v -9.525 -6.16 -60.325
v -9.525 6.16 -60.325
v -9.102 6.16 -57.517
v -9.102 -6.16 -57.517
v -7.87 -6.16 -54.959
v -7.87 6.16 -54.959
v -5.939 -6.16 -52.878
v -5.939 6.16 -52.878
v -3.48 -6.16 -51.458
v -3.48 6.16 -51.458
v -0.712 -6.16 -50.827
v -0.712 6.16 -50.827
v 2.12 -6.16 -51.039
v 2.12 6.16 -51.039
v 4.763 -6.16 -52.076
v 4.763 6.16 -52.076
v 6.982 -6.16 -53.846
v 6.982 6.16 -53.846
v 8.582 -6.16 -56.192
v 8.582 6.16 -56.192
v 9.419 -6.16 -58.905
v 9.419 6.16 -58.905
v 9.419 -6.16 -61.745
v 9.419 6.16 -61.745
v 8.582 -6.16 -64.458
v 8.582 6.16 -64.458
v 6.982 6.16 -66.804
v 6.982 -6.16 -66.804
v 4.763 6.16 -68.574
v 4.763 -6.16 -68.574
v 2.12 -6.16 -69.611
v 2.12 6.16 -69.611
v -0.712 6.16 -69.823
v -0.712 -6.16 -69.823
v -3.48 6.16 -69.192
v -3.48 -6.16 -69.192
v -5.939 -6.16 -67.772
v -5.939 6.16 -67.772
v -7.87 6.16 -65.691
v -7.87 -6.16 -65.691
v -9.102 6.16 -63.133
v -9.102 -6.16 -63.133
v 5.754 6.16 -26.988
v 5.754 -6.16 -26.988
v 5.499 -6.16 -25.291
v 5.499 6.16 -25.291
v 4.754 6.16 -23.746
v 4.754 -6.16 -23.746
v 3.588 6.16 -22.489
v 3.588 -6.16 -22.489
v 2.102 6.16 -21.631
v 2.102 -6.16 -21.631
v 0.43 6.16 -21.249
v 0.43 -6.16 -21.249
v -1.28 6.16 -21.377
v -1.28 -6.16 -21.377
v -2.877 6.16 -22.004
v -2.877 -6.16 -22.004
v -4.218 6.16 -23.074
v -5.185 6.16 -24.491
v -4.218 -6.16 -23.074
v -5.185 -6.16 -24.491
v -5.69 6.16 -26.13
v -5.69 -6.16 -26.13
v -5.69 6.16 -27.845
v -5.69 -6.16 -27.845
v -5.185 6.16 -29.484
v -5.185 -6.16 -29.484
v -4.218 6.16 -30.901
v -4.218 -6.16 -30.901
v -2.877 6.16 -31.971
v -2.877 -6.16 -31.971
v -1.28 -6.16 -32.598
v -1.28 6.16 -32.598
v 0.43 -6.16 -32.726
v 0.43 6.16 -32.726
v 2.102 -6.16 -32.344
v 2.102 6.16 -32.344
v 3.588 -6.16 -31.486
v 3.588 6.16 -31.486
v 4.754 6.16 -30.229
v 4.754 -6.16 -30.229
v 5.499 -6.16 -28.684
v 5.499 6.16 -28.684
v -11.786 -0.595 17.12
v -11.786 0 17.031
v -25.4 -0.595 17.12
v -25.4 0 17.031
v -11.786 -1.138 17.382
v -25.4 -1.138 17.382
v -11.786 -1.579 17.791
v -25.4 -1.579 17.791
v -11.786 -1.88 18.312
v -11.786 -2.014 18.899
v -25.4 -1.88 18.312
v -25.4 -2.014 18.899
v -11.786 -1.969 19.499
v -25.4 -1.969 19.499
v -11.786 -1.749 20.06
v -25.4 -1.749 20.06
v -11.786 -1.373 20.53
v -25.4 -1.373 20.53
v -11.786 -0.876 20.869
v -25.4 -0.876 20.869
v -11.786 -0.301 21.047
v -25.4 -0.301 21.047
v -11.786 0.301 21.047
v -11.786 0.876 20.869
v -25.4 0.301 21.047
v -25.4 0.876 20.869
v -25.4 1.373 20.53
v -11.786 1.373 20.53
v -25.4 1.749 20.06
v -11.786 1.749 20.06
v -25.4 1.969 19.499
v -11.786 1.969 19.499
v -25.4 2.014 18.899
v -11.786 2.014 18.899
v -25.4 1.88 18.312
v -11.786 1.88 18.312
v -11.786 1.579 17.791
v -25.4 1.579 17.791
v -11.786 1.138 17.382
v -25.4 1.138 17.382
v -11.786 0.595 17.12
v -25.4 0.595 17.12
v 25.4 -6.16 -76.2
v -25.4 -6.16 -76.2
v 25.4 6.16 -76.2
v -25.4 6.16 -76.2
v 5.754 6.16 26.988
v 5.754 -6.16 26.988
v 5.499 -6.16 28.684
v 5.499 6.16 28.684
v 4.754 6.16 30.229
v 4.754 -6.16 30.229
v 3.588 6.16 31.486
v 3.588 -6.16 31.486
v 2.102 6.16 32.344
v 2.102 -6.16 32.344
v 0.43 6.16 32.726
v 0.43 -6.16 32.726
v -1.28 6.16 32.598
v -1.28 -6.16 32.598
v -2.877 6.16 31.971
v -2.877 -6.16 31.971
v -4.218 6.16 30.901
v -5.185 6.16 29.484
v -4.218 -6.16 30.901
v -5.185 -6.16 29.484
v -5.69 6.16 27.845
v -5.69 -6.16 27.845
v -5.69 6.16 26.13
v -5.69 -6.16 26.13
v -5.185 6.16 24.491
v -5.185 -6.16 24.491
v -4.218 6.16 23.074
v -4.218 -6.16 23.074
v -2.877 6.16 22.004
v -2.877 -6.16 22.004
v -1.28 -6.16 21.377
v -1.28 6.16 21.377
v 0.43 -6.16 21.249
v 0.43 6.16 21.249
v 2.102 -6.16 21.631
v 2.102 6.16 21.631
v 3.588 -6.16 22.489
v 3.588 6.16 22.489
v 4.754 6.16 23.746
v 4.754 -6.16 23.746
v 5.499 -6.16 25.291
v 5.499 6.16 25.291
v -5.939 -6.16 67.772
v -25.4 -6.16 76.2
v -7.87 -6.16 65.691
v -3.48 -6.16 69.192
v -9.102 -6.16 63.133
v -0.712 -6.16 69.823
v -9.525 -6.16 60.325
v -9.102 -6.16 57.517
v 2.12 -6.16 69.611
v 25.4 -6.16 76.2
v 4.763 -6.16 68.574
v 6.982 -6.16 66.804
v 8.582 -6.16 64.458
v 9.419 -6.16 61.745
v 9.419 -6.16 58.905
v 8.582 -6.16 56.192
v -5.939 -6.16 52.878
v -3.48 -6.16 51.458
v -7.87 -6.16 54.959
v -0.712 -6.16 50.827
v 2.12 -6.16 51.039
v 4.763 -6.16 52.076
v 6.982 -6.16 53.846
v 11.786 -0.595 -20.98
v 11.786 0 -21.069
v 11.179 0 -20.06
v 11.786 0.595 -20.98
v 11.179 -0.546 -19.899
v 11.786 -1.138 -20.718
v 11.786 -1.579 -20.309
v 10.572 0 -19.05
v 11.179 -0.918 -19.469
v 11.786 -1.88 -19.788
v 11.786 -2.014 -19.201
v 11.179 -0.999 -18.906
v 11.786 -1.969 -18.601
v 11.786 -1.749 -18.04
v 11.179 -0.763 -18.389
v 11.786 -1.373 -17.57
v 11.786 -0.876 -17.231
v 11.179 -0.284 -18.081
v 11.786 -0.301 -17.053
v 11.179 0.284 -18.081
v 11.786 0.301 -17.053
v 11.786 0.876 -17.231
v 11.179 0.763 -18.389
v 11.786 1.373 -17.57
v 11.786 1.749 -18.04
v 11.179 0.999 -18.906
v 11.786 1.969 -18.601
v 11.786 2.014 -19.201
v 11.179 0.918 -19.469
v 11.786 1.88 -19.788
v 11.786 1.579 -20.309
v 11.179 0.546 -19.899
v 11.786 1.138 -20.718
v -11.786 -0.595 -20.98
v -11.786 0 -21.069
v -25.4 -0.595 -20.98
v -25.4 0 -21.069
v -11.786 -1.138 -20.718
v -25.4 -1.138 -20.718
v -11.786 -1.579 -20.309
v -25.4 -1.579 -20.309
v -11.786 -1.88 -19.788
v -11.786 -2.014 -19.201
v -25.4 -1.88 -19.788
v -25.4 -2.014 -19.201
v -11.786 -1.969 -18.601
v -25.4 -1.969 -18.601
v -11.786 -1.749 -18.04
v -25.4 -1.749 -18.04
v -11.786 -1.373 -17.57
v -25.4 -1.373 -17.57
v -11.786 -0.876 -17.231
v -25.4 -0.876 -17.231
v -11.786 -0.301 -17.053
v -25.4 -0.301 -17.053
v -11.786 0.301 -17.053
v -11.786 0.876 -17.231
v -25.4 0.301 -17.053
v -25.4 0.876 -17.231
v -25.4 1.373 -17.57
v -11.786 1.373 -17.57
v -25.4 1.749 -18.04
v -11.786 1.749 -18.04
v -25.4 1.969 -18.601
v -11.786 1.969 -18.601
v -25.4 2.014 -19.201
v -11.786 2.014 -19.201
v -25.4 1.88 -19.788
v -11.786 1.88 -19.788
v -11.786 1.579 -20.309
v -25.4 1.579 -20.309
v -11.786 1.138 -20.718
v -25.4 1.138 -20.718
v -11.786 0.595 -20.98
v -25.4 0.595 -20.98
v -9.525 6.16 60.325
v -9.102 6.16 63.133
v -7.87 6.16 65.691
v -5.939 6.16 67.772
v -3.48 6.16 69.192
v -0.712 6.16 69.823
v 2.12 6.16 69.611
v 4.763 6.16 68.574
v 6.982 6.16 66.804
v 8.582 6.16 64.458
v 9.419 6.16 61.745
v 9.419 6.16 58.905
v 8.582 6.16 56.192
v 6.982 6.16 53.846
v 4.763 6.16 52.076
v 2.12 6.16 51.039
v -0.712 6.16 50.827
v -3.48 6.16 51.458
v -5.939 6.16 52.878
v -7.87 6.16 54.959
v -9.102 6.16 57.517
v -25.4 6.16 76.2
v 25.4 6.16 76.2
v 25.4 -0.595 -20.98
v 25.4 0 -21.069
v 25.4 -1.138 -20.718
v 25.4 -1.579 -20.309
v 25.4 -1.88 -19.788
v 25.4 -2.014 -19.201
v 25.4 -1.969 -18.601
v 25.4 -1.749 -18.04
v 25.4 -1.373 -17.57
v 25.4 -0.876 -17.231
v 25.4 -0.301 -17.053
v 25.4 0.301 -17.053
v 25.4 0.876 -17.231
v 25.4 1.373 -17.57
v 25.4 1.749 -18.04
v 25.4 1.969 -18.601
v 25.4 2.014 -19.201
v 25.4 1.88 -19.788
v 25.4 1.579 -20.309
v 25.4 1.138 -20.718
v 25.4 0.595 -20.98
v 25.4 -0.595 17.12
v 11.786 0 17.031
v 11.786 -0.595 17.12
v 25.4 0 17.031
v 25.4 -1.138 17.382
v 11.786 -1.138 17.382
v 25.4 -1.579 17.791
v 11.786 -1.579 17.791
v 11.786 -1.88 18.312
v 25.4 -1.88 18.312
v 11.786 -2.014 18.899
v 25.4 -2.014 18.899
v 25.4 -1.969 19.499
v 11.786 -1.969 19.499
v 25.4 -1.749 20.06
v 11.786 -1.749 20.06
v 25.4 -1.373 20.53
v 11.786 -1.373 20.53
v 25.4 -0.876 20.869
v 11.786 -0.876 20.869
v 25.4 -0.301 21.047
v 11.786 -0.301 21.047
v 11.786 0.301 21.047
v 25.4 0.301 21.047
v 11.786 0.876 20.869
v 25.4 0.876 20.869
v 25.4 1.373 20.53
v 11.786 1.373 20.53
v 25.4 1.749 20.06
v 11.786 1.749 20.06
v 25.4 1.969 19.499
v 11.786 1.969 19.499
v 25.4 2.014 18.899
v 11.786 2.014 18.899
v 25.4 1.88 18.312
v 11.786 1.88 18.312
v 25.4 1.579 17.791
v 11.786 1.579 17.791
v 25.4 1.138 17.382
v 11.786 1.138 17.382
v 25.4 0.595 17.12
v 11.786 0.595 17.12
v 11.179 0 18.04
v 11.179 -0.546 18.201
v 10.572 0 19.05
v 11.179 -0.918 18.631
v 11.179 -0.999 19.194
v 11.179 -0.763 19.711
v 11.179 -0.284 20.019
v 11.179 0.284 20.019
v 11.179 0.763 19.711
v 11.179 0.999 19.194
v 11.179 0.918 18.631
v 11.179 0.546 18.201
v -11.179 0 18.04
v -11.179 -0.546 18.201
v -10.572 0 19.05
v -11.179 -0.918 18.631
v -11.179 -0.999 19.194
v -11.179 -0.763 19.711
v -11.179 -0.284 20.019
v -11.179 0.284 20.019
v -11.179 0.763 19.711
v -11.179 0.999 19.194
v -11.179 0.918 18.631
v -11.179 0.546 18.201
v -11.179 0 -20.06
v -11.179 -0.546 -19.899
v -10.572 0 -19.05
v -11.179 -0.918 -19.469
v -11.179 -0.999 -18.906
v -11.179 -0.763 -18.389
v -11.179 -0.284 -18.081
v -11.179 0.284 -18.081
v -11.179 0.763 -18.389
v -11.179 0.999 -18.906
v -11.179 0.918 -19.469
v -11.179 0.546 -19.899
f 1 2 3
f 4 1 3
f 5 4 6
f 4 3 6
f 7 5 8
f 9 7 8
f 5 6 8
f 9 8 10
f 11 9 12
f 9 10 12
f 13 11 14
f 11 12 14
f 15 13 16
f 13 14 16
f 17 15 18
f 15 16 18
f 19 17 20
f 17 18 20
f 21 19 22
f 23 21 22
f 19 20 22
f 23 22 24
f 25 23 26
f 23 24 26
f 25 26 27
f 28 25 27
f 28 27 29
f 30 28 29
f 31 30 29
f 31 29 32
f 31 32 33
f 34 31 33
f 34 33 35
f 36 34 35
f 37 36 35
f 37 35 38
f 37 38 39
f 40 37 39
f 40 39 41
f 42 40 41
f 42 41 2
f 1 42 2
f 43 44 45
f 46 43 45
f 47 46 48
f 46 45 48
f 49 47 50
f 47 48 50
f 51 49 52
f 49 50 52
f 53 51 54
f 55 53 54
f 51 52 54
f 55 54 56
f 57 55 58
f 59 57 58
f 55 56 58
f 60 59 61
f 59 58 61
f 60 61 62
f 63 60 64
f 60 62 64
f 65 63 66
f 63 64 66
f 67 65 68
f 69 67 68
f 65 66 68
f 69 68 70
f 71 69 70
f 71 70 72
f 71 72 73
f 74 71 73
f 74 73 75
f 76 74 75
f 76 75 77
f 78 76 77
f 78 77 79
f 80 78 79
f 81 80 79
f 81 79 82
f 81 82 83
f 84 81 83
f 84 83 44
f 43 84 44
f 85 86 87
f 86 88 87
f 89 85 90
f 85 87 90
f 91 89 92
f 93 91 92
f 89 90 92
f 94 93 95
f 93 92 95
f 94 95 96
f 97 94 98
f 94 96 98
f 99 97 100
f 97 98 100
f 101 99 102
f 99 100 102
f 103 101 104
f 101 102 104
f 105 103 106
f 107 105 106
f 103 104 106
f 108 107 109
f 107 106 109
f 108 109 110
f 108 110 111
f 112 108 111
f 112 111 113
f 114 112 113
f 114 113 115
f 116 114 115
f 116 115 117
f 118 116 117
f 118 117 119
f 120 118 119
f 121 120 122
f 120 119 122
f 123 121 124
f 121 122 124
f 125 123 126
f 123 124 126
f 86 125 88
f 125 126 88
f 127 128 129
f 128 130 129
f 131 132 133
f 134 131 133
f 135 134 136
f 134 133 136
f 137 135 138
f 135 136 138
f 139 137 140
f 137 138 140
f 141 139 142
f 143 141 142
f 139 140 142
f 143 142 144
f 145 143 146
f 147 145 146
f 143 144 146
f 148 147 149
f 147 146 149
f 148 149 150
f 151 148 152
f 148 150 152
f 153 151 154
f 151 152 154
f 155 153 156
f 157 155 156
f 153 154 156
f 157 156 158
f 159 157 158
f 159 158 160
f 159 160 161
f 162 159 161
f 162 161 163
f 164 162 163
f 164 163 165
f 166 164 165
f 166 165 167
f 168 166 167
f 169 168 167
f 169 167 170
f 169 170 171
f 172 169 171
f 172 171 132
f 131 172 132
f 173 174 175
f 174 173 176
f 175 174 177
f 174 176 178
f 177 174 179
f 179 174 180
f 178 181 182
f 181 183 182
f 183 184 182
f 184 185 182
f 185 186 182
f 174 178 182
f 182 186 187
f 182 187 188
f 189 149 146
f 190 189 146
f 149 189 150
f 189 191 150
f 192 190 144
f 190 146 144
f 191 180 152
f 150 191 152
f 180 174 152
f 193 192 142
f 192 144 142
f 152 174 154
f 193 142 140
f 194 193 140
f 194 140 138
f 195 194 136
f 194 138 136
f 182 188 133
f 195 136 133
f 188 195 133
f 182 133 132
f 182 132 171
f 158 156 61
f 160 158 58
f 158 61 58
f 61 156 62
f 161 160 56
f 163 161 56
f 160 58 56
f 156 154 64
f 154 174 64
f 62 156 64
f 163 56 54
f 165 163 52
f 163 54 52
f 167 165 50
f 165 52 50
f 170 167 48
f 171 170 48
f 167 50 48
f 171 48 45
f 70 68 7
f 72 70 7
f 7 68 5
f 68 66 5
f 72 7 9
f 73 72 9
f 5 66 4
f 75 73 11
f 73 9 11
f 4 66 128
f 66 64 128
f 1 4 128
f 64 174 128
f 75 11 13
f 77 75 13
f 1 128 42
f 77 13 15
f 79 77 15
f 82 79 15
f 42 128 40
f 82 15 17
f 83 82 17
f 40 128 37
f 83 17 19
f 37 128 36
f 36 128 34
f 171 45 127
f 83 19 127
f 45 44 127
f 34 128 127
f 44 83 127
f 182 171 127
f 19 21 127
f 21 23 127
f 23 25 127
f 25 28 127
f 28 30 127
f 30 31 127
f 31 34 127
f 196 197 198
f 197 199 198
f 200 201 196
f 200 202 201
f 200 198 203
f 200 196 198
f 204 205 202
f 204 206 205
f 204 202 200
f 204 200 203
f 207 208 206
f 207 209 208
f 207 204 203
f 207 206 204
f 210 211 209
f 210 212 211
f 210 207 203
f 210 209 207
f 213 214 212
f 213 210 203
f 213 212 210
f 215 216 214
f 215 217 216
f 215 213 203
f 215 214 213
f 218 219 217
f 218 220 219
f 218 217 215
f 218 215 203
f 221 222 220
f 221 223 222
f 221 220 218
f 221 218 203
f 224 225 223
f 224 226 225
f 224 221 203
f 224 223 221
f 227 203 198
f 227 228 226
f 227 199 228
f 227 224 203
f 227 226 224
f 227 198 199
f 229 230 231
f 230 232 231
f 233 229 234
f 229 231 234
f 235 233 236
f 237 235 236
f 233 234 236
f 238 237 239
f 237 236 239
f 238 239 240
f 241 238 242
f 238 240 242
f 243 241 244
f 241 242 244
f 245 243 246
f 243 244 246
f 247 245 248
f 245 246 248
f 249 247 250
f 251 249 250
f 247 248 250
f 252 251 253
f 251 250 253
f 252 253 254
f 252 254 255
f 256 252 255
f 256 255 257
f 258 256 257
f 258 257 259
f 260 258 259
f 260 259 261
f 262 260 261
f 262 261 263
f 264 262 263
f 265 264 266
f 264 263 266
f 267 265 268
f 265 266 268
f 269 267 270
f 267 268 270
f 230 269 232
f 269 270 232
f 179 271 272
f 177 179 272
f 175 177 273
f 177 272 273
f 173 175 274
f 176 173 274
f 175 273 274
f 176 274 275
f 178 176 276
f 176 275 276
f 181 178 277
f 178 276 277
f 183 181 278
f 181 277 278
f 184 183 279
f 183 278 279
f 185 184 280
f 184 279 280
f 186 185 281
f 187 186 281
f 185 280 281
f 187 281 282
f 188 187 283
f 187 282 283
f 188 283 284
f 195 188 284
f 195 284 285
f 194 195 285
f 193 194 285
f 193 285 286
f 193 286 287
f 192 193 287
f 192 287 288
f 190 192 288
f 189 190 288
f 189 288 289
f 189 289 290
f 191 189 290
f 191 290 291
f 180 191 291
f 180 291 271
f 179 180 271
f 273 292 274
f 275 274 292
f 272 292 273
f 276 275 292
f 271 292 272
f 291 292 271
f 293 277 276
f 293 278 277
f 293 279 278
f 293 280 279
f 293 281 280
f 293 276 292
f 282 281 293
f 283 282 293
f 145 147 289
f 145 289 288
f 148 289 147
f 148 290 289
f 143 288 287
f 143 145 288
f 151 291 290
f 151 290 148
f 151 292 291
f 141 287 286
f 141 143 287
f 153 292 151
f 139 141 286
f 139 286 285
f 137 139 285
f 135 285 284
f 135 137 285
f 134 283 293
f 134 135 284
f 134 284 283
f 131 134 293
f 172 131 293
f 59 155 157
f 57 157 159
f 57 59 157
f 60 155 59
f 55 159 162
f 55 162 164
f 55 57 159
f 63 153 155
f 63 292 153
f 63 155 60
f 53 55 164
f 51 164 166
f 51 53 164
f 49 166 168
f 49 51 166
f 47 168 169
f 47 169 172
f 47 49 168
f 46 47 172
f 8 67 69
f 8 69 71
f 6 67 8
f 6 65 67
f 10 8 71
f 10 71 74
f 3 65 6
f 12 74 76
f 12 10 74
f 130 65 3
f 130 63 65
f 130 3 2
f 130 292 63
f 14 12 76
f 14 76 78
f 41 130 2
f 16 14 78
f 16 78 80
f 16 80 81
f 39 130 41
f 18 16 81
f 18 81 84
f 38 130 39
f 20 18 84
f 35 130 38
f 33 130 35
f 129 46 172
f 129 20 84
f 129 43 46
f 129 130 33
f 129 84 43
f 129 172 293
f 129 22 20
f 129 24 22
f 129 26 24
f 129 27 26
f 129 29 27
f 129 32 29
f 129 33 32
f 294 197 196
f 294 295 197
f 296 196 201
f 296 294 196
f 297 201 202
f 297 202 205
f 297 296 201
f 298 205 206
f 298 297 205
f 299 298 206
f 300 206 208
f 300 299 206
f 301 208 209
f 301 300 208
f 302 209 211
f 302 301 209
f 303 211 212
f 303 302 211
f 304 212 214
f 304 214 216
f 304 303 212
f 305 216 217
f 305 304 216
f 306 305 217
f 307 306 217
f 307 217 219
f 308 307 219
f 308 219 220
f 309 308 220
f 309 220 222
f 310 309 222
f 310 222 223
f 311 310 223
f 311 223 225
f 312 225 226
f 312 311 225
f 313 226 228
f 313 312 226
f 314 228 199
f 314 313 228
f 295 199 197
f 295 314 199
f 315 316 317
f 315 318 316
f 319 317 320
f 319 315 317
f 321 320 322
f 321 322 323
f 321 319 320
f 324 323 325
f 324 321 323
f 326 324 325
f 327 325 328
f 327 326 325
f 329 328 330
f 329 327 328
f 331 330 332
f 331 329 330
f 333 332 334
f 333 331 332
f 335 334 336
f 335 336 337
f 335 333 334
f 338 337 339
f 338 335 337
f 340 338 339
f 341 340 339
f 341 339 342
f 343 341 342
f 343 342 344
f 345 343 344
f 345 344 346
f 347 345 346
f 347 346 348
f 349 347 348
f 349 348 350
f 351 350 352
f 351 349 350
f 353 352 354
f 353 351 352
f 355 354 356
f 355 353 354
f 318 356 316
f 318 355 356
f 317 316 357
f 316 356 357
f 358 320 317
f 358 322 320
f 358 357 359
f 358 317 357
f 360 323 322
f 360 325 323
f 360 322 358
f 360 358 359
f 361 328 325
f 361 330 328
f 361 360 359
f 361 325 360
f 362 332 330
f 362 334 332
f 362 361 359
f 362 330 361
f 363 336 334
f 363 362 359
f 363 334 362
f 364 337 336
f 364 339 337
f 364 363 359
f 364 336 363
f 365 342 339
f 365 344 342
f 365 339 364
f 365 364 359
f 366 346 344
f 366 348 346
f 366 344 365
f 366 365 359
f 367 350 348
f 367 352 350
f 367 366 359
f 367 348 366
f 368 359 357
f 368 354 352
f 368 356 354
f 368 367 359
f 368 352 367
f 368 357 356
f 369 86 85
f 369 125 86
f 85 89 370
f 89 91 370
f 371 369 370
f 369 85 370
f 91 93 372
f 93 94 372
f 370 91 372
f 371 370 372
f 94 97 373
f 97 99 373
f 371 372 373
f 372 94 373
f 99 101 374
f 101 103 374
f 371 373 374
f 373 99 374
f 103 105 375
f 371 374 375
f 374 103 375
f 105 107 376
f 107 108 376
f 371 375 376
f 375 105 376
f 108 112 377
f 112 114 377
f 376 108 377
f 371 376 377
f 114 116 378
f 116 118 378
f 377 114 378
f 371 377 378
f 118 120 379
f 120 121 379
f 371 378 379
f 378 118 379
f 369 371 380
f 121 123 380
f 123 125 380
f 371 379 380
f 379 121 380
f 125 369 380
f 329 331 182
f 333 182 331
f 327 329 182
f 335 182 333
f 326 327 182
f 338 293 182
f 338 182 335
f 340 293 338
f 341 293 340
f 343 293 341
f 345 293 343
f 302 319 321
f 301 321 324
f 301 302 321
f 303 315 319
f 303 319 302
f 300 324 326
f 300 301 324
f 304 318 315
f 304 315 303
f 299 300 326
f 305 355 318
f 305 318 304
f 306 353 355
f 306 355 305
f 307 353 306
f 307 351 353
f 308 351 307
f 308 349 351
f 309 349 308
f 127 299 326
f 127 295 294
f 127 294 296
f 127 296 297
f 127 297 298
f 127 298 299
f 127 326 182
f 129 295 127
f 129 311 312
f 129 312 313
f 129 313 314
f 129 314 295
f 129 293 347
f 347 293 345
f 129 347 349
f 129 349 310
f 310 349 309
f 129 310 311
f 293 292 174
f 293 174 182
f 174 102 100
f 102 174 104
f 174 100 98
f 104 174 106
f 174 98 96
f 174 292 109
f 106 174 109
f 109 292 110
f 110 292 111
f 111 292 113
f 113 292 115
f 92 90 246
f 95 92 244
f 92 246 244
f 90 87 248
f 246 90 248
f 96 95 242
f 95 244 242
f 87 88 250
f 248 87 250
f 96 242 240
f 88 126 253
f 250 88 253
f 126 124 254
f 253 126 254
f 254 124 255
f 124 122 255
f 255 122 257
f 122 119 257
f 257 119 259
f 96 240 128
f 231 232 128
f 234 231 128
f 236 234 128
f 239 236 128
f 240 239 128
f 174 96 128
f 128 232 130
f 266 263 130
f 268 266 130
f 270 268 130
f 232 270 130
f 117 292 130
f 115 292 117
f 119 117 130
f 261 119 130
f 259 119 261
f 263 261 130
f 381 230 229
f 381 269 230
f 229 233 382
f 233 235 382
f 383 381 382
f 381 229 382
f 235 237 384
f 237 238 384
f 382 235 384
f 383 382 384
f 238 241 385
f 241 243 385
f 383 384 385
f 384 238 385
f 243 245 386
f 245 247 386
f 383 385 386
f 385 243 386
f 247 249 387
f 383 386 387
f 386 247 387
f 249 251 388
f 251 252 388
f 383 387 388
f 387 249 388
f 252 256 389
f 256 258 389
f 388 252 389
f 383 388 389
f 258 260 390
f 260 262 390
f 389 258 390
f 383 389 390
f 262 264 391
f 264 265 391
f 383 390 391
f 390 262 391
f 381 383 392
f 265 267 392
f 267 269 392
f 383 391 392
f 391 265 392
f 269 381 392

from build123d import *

# Parameters (mm, degrees)
SKETCH1_W                       = 50.8
SKETCH1_H                       = 152.4
EXTRUDE1_DEPTH                  = 6.1595
CUT_EXTRUDE1_REACH              = 14.319
SKETCH2_R                       = 9.525
F_1_2_20_TAPPED_HOLE1_D         = 11.50874
F_1_2_20_TAPPED_HOLE1_DEPTH     = 12.319
F_10_32_TAPPED_HOLE1_AT_2_COUNT = 2
F_10_32_TAPPED_HOLE1_AT_2_PITCH = 38.1


with BuildPart() as part:
    # Sketch1 → Extrude1 (new body, symmetric)
    with BuildSketch(Plane(origin=(0, 0, 0), x_dir=(1, 0, 0), z_dir=(0, 1, 0))):
        Rectangle(SKETCH1_W, SKETCH1_H)
    extrude(amount=EXTRUDE1_DEPTH, both=True)

    # Sketch2 → Cut-Extrude1 (cut, up to next)
    with BuildSketch(Plane(origin=(0, 6.1595, 0), x_dir=(-1, 0, 0), z_dir=(0, 1, 0)), mode=Mode.PRIVATE) as cut_extrude1_sk1:
        with Locations((0, -60.325)):
            Circle(SKETCH2_R)
    cut_extrude1_tool1 = extrude(cut_extrude1_sk1.sketch, amount=-CUT_EXTRUDE1_REACH, mode=Mode.PRIVATE) & part.part
    add(cut_extrude1_tool1.solids().sort_by_distance((0, 6.1595, -60.325))[0], mode=Mode.SUBTRACT)
    # Sketch2 → Cut-Extrude1 (cut, up to next)
    with BuildSketch(Plane(origin=(0, 6.1595, 0), x_dir=(-1, 0, 0), z_dir=(0, 1, 0)), mode=Mode.PRIVATE) as cut_extrude1_sk2:
        with Locations((0, 60.325)):
            Circle(SKETCH2_R)
    cut_extrude1_tool2 = extrude(cut_extrude1_sk2.sketch, amount=-CUT_EXTRUDE1_REACH, mode=Mode.PRIVATE) & part.part
    add(cut_extrude1_tool2.solids().sort_by_distance((0, 6.1595, 60.325))[0], mode=Mode.SUBTRACT)

    # 1/2-20 Tapped Hole1
    with Locations(Plane(origin=(0, 6.1595, 0), x_dir=(-1, 0, 0), z_dir=(0, 1, 0))):
        with Locations((0, -26.9875), (0, 26.9875)):
            Hole(F_1_2_20_TAPPED_HOLE1_D / 2, depth=F_1_2_20_TAPPED_HOLE1_DEPTH)

    # Sketch10 → #10-32 Tapped Hole1 (revolve, cut)
    with BuildSketch(Plane(origin=(25.4, 0, 19.05), x_dir=(0, 0, -1), z_dir=(0, 1, 0))):
        Polygon((0, 0), (0, 14.827717848), (2.0193, 13.6144), (2.0193, 0), align=None)
    f_10_32_tapped_hole1 = revolve(axis=Axis((31.75, 0, 19.05), (-1, 0, 0)), mode=Mode.SUBTRACT)

    # #10-32 Tapped Hole1 at 2: #10-32 Tapped Hole1 ×2
    with Locations(*[(0, 0, -i * F_10_32_TAPPED_HOLE1_AT_2_PITCH) for i in range(1, F_10_32_TAPPED_HOLE1_AT_2_COUNT)]):
        add(f_10_32_tapped_hole1, mode=Mode.SUBTRACT)

    # Mirror1: #10-32 Tapped Hole1 across plane
    add(f_10_32_tapped_hole1.mirror(Plane(origin=(0, 0, 0), x_dir=(0, 0, 1), z_dir=(1, 0, 0))), mode=Mode.SUBTRACT)

    # Mirror1 copy 1 sketch → Mirror1 copy 1 (revolve, cut)
    with BuildSketch(Plane(origin=(-25.4, 0, -19.05), x_dir=(0, 0, -1), z_dir=(0, 1, 0))):
        Polygon((0, 0), (0, -14.827717848), (2.0193, -13.6144), (2.0193, 0), align=None)
    revolve(axis=Axis((-31.75, 0, -19.05), (-1, 0, 0)), mode=Mode.SUBTRACT)


solid = part.part
